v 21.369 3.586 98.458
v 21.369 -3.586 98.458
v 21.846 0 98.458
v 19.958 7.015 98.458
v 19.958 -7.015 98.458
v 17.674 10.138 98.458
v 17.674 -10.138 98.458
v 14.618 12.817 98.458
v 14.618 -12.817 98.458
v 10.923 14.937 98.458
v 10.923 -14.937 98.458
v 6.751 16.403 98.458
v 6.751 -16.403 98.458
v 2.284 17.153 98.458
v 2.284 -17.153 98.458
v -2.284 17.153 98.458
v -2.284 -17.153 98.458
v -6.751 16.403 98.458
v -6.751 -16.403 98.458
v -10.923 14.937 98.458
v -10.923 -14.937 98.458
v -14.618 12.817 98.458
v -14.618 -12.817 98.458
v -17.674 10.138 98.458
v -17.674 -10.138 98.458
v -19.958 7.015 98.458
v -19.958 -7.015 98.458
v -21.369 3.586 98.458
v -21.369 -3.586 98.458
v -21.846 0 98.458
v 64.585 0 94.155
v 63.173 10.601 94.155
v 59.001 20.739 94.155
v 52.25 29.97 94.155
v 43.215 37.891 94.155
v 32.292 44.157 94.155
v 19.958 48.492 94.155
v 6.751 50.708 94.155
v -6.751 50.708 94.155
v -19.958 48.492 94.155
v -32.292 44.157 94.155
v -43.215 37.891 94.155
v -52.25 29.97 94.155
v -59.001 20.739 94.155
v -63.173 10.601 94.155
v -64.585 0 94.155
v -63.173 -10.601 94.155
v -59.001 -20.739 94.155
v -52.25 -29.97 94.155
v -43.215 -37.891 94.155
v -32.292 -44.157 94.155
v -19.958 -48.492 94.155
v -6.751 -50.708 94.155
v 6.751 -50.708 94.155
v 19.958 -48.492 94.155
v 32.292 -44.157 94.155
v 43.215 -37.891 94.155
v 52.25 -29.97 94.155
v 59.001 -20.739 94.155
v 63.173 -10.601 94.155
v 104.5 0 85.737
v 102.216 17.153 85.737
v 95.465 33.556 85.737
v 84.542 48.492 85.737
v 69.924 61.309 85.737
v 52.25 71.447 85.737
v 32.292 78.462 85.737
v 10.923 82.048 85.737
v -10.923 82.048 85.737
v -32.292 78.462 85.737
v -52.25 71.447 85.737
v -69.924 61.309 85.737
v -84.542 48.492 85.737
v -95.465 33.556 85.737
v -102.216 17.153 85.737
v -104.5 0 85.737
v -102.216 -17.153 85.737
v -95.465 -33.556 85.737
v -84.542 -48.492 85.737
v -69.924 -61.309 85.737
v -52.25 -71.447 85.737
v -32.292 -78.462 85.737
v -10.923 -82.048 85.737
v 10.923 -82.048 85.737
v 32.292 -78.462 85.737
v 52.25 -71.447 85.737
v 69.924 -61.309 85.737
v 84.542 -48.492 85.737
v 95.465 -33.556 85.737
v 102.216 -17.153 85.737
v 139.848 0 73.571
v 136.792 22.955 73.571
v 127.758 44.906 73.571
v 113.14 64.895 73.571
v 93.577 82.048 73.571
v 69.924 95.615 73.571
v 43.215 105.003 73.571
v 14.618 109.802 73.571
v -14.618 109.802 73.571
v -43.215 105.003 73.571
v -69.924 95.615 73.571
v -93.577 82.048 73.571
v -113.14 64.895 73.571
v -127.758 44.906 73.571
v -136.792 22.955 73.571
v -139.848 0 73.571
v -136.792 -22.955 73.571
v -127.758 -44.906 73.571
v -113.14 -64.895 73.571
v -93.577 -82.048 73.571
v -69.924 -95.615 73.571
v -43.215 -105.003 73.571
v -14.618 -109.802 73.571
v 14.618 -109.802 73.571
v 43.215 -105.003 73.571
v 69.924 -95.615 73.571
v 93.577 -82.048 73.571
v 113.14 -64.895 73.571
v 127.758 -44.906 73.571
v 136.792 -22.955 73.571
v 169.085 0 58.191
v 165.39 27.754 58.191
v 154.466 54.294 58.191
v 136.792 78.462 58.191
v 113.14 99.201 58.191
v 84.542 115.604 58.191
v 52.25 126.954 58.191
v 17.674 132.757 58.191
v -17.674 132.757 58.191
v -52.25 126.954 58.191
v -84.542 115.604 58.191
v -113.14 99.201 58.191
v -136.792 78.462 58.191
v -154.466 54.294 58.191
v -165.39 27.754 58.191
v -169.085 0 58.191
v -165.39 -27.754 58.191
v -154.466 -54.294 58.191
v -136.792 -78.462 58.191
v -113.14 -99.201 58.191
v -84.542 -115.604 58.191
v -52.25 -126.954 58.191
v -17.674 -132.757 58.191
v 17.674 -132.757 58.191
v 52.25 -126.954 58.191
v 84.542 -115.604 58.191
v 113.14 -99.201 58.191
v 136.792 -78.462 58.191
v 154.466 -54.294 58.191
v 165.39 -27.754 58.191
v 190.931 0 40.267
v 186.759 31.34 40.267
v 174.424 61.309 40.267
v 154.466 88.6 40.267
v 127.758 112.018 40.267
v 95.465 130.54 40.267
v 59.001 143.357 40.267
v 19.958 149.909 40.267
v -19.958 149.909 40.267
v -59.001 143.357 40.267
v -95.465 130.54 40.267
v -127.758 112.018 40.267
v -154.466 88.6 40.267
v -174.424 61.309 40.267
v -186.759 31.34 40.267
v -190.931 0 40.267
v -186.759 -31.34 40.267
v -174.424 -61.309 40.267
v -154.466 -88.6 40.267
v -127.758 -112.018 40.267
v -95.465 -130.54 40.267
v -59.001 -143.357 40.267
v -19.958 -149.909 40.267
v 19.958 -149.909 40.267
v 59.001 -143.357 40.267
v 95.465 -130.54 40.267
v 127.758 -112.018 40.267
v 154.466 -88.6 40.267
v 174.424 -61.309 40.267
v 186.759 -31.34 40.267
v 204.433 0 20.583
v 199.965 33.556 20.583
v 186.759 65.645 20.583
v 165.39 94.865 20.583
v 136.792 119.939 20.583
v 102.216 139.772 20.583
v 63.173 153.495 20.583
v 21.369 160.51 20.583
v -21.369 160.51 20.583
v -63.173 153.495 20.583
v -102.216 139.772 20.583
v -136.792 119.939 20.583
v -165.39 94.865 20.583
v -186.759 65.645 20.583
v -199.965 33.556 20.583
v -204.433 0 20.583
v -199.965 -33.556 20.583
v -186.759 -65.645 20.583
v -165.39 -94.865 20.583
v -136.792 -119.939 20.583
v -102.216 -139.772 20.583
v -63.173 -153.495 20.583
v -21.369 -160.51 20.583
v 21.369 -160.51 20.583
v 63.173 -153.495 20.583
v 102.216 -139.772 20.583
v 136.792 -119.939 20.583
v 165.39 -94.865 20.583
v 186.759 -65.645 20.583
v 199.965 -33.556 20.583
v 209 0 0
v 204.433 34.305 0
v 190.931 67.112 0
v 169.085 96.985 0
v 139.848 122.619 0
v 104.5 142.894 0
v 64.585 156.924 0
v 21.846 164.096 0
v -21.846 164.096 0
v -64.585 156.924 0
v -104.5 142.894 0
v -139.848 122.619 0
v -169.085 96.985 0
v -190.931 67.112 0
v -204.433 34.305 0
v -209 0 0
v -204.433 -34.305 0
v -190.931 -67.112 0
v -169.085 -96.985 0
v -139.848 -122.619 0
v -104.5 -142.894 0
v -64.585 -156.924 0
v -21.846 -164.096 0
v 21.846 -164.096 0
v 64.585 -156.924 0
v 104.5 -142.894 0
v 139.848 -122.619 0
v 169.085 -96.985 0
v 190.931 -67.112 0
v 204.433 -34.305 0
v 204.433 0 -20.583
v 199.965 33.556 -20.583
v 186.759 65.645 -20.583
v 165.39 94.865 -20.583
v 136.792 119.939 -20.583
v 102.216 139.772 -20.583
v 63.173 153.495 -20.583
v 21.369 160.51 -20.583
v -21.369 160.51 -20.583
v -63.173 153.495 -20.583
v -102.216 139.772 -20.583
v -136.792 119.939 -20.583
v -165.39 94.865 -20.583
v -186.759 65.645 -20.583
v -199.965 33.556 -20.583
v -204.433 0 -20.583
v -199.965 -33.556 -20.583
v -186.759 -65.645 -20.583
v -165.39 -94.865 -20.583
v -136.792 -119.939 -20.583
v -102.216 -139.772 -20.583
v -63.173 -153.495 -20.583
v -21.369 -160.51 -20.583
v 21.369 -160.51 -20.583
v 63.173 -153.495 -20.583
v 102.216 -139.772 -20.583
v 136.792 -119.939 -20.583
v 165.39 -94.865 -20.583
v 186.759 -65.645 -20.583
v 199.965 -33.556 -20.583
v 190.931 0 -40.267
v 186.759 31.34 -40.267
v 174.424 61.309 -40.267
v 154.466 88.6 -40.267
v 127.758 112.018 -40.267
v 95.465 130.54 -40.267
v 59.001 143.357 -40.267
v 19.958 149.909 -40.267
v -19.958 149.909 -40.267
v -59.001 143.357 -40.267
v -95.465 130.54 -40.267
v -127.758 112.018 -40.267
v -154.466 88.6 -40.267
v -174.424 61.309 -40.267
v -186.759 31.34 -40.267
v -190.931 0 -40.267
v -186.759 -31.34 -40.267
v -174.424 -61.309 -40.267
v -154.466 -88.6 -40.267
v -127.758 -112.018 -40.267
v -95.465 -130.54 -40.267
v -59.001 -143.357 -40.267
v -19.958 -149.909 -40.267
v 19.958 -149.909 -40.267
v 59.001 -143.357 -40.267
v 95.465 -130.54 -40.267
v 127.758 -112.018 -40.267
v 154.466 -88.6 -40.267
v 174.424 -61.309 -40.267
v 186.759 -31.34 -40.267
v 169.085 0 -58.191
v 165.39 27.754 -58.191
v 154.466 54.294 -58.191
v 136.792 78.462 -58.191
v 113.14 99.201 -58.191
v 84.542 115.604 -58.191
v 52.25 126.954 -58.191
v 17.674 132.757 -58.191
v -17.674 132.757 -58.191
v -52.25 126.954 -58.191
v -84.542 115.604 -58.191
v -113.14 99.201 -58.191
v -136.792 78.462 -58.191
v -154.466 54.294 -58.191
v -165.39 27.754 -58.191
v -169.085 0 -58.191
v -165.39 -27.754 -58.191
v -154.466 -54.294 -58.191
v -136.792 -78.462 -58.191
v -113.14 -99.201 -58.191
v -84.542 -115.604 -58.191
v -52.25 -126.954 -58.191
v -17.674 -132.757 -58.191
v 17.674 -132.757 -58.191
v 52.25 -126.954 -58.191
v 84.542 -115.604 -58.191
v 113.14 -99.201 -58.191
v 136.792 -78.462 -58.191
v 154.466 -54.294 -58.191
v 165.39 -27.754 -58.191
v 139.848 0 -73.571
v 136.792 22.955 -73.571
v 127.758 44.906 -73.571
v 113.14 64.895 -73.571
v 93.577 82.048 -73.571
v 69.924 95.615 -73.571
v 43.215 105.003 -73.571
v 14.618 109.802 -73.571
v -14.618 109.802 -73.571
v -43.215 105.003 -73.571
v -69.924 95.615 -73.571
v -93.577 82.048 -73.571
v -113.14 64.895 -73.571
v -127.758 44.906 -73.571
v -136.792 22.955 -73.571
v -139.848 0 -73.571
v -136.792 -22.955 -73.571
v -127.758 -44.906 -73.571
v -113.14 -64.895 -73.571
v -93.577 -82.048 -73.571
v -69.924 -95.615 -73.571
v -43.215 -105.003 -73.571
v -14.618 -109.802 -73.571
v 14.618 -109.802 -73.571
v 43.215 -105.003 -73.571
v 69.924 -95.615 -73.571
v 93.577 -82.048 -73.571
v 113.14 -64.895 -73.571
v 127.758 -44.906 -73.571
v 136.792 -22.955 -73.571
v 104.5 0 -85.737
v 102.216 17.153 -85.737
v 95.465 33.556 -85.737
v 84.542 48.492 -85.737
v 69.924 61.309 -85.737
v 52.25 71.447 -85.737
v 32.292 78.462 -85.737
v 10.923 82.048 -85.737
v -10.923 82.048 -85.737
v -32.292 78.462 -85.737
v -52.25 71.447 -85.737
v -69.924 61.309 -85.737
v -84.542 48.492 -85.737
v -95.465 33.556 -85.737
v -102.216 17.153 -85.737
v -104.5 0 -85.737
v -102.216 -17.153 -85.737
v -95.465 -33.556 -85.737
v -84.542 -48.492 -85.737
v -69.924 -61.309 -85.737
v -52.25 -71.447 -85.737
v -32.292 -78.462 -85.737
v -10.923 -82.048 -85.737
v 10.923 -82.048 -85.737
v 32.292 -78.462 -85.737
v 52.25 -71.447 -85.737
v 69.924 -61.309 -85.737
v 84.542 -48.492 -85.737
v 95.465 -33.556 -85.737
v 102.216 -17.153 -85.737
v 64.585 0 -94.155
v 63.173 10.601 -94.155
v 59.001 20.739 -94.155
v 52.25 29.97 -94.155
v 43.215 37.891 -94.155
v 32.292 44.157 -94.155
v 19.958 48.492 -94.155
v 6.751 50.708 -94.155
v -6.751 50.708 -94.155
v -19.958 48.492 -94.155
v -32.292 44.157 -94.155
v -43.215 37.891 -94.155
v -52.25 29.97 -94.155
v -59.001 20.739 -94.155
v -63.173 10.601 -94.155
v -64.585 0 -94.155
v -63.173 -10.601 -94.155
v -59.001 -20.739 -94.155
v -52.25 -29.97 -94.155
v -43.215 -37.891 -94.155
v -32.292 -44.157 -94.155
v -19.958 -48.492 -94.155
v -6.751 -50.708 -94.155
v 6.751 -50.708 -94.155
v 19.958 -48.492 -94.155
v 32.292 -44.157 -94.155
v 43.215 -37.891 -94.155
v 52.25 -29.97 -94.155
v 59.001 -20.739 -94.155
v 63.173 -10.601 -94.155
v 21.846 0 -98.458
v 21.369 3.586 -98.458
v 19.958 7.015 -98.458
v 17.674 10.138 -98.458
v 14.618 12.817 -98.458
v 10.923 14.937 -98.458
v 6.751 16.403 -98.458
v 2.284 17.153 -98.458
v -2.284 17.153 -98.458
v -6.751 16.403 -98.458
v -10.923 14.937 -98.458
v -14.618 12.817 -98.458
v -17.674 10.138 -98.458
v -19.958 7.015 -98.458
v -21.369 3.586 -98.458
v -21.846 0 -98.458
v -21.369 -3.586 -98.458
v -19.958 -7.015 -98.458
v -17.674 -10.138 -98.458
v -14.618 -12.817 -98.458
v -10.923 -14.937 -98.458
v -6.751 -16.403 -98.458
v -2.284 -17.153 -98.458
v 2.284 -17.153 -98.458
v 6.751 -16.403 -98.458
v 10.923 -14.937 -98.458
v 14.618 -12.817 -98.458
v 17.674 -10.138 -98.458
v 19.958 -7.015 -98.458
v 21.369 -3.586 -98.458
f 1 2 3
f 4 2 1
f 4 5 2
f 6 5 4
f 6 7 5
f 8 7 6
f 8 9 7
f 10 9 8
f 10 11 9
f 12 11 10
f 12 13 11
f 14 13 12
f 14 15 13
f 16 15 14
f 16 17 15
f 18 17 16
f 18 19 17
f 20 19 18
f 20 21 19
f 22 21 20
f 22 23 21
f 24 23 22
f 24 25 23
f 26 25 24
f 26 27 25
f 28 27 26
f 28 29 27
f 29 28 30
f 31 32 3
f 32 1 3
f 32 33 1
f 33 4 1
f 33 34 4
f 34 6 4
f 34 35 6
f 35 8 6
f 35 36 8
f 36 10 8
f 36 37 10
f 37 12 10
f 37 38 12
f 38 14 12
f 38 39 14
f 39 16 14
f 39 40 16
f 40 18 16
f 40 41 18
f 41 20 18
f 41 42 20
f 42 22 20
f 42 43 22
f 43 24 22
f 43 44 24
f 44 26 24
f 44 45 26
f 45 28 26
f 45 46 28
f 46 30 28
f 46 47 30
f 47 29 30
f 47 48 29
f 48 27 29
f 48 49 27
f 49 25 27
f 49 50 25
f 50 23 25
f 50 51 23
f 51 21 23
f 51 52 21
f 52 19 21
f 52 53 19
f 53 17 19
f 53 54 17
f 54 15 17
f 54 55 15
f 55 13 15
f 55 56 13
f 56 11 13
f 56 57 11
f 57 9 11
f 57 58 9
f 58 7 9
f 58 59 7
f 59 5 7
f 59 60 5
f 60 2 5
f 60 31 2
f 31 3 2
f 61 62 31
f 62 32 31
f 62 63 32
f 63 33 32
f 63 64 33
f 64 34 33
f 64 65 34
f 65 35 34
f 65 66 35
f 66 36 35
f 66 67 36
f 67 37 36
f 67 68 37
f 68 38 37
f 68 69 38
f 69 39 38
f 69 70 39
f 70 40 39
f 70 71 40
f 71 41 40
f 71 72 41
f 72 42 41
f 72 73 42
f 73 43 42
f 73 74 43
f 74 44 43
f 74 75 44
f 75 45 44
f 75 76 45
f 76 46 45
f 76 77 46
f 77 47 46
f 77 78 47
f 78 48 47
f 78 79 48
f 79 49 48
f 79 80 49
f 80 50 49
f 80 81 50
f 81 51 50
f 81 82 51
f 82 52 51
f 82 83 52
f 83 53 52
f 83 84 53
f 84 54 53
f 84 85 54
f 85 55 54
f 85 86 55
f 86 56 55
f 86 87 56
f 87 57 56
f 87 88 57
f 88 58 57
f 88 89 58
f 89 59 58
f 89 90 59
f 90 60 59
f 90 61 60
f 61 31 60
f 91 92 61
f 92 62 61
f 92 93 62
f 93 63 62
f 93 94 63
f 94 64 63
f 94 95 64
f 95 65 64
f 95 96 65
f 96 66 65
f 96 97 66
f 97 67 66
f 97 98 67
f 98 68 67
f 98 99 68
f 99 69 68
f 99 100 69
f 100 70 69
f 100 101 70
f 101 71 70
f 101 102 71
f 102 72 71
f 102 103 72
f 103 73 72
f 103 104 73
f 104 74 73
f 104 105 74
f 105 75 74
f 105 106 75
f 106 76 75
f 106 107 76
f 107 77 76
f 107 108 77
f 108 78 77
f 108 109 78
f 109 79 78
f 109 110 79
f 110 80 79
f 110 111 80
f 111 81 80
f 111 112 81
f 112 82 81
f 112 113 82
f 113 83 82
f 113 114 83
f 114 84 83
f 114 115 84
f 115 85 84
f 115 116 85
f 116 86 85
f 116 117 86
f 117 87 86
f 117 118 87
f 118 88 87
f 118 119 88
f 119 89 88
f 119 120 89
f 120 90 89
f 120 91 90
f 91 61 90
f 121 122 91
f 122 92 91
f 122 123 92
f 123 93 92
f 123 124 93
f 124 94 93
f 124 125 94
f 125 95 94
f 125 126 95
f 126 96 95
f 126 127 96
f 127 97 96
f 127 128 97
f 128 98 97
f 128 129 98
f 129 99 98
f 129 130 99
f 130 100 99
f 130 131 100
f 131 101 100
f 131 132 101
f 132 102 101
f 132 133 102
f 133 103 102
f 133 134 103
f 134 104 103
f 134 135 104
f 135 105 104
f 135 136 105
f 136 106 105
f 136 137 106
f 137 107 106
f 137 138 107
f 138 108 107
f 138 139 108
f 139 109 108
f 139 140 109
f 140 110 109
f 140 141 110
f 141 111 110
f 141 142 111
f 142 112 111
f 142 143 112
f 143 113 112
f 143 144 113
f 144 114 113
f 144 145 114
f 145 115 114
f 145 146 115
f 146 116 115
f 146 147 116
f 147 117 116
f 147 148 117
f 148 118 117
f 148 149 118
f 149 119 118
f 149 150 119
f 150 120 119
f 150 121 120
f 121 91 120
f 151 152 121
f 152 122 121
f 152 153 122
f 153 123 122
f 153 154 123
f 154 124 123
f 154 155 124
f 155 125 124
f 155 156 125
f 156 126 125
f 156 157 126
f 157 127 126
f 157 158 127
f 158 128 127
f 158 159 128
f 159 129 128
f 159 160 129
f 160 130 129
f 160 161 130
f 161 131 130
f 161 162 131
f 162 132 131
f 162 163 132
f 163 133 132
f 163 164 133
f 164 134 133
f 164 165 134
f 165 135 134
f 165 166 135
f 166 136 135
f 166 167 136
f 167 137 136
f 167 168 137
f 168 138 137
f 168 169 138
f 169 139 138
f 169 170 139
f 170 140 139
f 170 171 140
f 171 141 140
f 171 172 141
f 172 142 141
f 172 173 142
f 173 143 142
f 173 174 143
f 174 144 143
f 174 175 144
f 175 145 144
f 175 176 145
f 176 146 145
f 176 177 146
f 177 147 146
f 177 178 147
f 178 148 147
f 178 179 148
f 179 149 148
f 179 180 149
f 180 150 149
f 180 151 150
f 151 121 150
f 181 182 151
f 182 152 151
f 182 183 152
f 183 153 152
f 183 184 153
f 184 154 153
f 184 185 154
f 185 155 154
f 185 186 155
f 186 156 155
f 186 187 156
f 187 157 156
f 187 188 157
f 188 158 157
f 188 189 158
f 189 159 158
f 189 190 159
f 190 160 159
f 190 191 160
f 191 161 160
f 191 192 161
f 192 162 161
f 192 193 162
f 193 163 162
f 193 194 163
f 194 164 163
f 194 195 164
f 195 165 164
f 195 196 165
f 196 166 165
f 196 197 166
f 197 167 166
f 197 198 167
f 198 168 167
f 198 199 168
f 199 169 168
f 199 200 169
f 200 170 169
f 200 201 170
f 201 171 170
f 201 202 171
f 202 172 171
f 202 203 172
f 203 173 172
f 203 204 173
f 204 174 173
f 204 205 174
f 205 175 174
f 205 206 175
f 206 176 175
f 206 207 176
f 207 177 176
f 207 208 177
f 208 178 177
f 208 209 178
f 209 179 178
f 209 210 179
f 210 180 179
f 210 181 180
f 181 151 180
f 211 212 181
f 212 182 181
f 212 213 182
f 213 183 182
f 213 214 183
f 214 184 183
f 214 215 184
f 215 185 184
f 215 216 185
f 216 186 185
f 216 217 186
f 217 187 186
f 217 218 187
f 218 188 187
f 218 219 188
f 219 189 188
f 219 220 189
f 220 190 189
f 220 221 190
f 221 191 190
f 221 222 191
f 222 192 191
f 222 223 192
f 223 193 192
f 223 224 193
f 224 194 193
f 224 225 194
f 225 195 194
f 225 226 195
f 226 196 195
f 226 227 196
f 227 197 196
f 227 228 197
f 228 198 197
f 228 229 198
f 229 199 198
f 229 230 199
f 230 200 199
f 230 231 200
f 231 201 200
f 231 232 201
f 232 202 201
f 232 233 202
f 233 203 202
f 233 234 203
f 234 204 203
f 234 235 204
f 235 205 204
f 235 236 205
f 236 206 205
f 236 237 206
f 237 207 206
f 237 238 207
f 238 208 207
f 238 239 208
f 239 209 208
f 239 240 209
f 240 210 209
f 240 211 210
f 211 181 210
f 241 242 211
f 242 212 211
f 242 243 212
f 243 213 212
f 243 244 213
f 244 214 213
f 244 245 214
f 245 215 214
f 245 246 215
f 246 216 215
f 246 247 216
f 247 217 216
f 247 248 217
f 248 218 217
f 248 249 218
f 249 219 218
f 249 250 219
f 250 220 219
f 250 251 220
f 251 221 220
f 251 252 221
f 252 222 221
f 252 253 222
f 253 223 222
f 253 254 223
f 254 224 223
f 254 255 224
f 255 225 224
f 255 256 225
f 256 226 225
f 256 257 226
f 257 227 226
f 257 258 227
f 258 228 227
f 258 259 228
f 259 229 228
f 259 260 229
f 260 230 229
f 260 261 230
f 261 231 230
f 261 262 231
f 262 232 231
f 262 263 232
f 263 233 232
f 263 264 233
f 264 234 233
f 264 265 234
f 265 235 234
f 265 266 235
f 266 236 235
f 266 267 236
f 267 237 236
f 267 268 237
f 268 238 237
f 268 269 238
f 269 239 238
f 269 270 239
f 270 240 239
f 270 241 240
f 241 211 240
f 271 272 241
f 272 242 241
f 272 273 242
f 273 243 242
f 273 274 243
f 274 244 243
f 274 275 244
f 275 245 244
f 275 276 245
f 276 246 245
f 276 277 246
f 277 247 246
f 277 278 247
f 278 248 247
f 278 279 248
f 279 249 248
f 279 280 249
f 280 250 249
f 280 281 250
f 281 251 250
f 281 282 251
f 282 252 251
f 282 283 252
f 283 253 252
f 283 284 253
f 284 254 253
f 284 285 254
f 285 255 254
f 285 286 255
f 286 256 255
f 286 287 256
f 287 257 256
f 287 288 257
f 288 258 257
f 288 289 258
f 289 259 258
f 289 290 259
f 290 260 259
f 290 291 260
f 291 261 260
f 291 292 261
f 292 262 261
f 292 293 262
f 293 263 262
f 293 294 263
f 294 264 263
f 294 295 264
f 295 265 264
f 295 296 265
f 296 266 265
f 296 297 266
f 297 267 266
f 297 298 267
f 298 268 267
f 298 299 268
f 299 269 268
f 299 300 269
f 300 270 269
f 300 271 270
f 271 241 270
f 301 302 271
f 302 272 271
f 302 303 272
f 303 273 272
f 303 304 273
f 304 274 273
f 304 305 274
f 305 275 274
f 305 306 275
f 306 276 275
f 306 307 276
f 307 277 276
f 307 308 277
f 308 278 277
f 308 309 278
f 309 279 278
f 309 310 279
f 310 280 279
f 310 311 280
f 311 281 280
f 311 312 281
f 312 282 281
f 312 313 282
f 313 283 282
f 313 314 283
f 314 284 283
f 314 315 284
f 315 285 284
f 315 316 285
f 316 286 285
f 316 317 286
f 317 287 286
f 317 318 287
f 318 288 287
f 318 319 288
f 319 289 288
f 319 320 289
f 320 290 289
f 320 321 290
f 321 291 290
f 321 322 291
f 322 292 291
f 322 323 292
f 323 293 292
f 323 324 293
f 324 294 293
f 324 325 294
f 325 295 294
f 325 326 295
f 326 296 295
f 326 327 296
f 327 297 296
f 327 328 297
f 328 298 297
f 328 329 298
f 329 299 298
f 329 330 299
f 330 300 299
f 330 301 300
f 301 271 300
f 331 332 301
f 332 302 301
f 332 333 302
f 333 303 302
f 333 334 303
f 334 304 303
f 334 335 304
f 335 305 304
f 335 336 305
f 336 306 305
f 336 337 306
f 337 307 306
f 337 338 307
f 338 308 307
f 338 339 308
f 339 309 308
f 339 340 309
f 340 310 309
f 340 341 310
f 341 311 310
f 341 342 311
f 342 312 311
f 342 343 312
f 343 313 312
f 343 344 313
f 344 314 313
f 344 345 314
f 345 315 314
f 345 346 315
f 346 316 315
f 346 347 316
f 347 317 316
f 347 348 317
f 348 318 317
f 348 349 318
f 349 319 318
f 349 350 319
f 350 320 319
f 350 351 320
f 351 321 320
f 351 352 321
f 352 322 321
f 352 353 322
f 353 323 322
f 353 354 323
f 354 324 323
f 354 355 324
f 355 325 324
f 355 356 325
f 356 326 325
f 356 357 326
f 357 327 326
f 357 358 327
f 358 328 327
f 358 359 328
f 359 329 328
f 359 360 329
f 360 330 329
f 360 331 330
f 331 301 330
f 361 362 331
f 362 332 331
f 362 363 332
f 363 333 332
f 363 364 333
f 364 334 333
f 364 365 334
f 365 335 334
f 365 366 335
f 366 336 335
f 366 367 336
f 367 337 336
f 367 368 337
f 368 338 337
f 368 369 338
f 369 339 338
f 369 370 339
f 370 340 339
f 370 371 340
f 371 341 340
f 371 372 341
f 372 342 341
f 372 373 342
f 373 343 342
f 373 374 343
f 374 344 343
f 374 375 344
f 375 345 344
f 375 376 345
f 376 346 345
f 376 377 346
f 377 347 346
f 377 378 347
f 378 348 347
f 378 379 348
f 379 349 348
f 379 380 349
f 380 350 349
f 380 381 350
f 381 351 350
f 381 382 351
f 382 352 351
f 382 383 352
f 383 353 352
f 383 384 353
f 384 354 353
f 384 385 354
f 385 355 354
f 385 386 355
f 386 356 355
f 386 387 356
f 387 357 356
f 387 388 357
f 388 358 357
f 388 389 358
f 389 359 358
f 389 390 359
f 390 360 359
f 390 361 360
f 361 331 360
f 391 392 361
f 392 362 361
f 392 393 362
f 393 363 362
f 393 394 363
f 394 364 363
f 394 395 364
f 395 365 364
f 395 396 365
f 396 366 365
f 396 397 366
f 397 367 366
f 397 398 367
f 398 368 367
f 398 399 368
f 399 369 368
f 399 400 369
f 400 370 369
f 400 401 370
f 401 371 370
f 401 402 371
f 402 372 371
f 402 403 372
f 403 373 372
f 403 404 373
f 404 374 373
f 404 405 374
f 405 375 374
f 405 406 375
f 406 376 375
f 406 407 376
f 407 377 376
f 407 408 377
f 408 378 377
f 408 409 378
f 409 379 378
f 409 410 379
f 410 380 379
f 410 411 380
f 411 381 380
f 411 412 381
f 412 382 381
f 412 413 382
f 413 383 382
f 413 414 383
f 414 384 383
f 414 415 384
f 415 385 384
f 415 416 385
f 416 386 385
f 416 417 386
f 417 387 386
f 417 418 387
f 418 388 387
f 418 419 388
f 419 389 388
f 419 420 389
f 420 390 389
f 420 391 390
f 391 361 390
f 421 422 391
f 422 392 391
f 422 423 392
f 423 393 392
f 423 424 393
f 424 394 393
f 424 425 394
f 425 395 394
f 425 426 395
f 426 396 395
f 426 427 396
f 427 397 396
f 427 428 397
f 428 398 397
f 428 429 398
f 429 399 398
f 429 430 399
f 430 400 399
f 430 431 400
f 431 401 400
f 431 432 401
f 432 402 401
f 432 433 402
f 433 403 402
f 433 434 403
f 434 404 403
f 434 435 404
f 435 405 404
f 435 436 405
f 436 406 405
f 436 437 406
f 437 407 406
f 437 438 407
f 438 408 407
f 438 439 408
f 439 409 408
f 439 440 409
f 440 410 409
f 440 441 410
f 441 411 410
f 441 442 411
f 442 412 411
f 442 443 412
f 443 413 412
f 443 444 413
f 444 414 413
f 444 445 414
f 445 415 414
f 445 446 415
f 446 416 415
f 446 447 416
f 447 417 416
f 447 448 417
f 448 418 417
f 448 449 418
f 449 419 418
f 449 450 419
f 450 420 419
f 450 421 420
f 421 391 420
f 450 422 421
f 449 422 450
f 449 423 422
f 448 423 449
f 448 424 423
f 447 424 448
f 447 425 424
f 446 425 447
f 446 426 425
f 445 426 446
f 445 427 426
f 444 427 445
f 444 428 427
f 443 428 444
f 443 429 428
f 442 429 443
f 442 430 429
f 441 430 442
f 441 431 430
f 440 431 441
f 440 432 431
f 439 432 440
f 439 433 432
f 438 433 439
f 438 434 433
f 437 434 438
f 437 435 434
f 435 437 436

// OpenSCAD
// Generated by SolidPython 1.0.1 on 2020-07-29 00:46:54


scale(v = [19, 15, 9]) {
	sphere(r = 11);
}
/***********************************************
*********      SolidPython code:      **********
************************************************
 
# import packages: SolidPython
from solid import *
from solid.utils import *
from itertools import chain, combinations, permutations


class Resize:

    def __init__(self, scad_file):
        self.scad_file = scad_file
        #self.scad_file = import_scad(scad_file)
        # cone/cylinder param:
        self.r1 = 0
        self.r2 = 0
        self.h = 0
        # rectangular prism param:
        self.w = 0
        self.l = 0
        # ellipse param:
        self.r = 0

    # import OpenScad code (file name corresponds to shape)


    # classify shape + parameters
    def assign(self, param1, param2, param3):
        if self.scad_file == 'cone.scad':
            self.r1 = param1
            self.r2 = param2
            self.h = param3
        elif self.scad_file == 'cylinder.scad':
            self.r1 = param1
            self.r2 = param2
            self.h = param3
        elif self.scad_file == 'rectangularPrism.scad':
            self.h = param1
            self.l = param2
            self.w = param3
        else:
            self.r = param1
            self.h = param2

    # resize parameters
    def iterate(self):
        x = range(3, 20, 2)
        i = 1
        if self.scad_file == 'cone.scad':
            tempList = list(permutations(x, 2))
            for temp in tempList:
                param1 = temp[0]
                param2 = temp[1]
                filepath = 'produced_scad_files/' + 'cone' + str(param1) + '_' + str(param2) + '_' + '.scad'
                scad_render_to_file(cylinder(h=param1, r1=param2, r2=0), filepath)

        elif self.scad_file == 'cylinder.scad':
            tempList = list(permutations(x, 3))
            for temp in tempList:
                param1 = temp[0]
                param2 = temp[1]
                filepath = 'produced_scad_files/' + 'cylinder' + str(param1) + '_' + str(param2) + '_' + '.scad'
                scad_render_to_file(cylinder(h=param1, r1=param2, r2=param2), filepath)

        elif self.scad_file == 'rectangularPrism.scad':
            tempList = list(permutations(x, 3))
            for temp in tempList:
                param1 = temp[0]
                param2 = temp[1]
                param3 = temp[2]
                filepath = 'produced_scad_files/' + 'rectangularPrism' + str(param1) + '_' + str(param2) + '_' + str(
                    param3) + '.scad'
                scad_render_to_file(cube(size=(param1, param2, param3)), filepath)

        elif self.scad_file == 'ellipse.scad':
            tempList = list(permutations(x, 4))
            for temp in tempList:
                param1 = temp[0]
                param2 = temp[1]
                param3 = temp[2]
                param4 = temp[3]
                filepath = 'produced_scad_files/' + 'ellipse' + str(param1) + '_' + str(param2) + '_' + str(param3) + '_' + str(param4) + '.scad'
                scad_render_to_file(scale([param1, param2, param3])(sphere(r=param4)), filepath)

    def render_to_scadfile(self):
        scad_render_to_file(scad, 'example.scad') 
 
************************************************/
